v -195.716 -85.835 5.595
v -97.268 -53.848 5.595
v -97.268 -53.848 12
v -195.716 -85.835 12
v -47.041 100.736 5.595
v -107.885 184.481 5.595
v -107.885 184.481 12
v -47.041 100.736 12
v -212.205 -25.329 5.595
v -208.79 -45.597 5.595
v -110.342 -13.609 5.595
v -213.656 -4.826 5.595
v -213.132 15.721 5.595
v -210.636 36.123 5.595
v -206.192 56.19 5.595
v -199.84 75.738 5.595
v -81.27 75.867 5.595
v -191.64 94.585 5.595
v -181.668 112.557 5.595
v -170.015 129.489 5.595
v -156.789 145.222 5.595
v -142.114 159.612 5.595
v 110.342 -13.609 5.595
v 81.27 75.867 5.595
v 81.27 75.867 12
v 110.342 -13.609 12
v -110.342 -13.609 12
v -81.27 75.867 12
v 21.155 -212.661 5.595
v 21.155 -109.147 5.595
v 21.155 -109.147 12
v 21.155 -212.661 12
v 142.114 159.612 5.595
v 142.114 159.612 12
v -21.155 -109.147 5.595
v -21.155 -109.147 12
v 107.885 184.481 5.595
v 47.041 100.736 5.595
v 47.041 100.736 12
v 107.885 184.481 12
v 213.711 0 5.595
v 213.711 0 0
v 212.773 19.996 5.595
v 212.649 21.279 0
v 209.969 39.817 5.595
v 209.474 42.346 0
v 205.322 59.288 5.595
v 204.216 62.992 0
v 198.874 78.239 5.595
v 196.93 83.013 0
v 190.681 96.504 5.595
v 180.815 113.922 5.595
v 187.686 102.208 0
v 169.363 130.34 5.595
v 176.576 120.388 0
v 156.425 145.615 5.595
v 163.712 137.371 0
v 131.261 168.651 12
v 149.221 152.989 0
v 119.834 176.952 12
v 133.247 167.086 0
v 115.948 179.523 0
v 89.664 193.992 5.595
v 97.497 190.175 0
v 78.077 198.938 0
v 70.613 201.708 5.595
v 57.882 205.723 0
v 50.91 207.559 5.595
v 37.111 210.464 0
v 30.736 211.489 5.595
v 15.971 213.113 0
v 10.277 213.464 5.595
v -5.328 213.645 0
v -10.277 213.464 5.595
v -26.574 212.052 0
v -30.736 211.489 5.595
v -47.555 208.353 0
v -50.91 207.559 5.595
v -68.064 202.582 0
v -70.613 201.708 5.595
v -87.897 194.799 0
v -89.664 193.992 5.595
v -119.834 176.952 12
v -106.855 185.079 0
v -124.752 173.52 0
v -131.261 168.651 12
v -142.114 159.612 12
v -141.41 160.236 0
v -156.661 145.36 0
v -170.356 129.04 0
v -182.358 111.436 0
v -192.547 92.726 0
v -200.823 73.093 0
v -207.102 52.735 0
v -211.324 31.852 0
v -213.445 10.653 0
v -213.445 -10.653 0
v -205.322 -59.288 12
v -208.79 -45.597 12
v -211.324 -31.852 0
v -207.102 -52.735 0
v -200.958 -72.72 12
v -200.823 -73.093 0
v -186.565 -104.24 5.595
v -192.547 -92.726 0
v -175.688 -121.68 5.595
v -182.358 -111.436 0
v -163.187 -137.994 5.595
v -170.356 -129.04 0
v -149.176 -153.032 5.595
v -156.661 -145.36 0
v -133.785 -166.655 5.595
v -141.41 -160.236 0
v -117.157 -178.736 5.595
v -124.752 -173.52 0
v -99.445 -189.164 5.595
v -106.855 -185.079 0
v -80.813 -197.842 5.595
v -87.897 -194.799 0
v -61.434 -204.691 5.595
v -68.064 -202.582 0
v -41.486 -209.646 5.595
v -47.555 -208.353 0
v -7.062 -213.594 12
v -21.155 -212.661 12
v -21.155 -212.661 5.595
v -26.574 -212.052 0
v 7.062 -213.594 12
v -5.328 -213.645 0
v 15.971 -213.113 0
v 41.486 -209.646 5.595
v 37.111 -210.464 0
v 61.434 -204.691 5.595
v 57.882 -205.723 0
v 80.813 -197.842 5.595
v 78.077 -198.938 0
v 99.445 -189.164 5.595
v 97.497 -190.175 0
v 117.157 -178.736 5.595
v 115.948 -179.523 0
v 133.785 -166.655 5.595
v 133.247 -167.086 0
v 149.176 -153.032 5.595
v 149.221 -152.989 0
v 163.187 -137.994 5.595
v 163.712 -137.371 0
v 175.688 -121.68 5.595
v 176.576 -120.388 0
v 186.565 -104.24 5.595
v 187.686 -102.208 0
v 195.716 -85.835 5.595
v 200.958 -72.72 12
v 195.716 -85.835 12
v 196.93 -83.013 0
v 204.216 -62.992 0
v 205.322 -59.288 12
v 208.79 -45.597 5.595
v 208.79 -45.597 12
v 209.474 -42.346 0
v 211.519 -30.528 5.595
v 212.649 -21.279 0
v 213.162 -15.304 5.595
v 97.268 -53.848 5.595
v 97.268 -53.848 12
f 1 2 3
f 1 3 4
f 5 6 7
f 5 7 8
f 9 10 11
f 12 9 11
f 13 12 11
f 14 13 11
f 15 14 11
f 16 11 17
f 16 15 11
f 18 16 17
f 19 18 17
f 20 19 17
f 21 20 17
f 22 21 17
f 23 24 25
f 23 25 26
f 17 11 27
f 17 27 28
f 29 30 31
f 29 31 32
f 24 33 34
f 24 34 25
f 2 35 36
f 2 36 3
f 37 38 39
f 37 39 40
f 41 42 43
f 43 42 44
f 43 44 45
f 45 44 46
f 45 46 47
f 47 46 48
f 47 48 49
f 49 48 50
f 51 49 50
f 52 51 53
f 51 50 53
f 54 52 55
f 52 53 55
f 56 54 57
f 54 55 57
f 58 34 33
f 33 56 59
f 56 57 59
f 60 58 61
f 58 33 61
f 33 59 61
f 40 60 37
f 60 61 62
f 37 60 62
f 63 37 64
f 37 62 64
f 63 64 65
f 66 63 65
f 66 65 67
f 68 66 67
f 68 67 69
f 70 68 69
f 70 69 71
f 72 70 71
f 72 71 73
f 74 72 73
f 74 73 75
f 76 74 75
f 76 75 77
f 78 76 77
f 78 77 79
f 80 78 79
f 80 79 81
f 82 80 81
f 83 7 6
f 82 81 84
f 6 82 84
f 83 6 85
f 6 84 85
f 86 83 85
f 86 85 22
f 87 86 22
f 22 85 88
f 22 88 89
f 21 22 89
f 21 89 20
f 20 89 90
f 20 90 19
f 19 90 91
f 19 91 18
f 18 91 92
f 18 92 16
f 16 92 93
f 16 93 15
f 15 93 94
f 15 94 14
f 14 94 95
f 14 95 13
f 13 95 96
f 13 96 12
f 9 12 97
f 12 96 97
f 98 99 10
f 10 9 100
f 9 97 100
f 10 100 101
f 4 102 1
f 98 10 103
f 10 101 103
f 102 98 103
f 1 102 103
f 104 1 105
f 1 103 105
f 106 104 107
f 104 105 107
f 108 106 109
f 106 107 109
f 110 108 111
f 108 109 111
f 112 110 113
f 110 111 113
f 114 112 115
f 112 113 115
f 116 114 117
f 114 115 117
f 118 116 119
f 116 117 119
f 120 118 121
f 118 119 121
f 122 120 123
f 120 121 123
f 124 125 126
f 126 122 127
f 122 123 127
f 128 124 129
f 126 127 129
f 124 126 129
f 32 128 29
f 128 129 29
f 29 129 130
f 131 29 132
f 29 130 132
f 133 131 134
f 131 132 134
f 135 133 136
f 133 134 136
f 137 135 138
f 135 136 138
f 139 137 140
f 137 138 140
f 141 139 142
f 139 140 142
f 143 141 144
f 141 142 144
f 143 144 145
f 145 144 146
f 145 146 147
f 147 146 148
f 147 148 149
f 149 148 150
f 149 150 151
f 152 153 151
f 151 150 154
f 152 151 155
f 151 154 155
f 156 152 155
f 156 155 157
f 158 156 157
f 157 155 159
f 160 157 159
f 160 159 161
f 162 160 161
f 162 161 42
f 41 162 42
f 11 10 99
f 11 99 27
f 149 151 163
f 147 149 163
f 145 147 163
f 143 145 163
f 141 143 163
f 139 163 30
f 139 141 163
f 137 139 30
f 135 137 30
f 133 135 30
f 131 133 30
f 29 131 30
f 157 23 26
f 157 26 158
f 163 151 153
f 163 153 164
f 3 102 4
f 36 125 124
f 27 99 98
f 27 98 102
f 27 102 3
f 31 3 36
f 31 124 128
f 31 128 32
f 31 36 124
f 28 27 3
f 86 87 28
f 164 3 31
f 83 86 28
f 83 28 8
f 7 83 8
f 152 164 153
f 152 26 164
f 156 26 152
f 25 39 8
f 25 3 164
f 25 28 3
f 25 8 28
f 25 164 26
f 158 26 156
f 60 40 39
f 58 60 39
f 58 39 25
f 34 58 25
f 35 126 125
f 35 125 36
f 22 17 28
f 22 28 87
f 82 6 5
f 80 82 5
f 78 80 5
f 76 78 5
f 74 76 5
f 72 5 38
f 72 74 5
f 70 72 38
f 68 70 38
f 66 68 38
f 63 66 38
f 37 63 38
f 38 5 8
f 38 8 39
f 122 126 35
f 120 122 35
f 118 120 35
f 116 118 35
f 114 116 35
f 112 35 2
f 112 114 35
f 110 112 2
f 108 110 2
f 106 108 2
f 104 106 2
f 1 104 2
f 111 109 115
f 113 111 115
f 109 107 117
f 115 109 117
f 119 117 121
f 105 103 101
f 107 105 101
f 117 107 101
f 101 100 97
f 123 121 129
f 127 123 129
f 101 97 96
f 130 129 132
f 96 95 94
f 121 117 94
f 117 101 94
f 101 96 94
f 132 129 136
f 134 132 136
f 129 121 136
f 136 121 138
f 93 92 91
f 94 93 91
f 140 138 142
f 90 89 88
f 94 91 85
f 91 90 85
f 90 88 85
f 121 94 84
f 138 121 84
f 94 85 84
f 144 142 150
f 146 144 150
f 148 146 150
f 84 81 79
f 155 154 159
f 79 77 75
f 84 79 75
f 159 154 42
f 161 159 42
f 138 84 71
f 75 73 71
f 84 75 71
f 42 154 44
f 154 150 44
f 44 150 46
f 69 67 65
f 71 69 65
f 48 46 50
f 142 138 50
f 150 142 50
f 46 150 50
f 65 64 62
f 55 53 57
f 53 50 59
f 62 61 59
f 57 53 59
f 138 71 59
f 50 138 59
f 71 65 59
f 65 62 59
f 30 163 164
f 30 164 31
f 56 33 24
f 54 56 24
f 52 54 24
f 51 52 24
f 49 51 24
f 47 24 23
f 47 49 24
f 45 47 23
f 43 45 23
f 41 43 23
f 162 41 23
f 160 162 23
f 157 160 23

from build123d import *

# Parameters (mm, degrees)
SKETCH1_R           = 213.710950615
BOSS_EXTRUDE1_DEPTH = 12
CUT_EXTRUDE1_START  = -6.405003169
CUT_EXTRUDE1_DEPTH  = 6.405003169
CIRPATTERN1_COUNT   = 5


with BuildPart() as part:
    # Sketch1 → Boss-Extrude1 (new body)
    with BuildSketch(Plane.XY):
        Circle(SKETCH1_R)
    extrude(amount=BOSS_EXTRUDE1_DEPTH)

    # Sketch2 → Cut-Extrude1 (cut)
    with BuildSketch(Plane.XY.offset(12).offset(CUT_EXTRUDE1_START)):
        with BuildLine():
            Line((-47.040542179, 100.736288781), (47.040542179, 100.736288781))
            Line((47.040542179, 100.736288781), (107.884686522, 184.48106902))
            ThreePointArc((107.884686522, 184.48106902), (0, 213.710950615), (-107.884686522, 184.48106902))
            Line((-107.884686522, 184.48106902), (-47.040542179, 100.736288781))
        make_face()
    cut_extrude1 = extrude(amount=CUT_EXTRUDE1_DEPTH, mode=Mode.SUBTRACT)

    # CirPattern1: Cut-Extrude1 ×5 about axis
    cirpattern1_axis = Axis((0, 0, 0), (0, 0, 1))
    for i in range(1, CIRPATTERN1_COUNT):
        add(cut_extrude1.rotate(cirpattern1_axis, i * 360 / CIRPATTERN1_COUNT), mode=Mode.SUBTRACT)


solid = part.part
